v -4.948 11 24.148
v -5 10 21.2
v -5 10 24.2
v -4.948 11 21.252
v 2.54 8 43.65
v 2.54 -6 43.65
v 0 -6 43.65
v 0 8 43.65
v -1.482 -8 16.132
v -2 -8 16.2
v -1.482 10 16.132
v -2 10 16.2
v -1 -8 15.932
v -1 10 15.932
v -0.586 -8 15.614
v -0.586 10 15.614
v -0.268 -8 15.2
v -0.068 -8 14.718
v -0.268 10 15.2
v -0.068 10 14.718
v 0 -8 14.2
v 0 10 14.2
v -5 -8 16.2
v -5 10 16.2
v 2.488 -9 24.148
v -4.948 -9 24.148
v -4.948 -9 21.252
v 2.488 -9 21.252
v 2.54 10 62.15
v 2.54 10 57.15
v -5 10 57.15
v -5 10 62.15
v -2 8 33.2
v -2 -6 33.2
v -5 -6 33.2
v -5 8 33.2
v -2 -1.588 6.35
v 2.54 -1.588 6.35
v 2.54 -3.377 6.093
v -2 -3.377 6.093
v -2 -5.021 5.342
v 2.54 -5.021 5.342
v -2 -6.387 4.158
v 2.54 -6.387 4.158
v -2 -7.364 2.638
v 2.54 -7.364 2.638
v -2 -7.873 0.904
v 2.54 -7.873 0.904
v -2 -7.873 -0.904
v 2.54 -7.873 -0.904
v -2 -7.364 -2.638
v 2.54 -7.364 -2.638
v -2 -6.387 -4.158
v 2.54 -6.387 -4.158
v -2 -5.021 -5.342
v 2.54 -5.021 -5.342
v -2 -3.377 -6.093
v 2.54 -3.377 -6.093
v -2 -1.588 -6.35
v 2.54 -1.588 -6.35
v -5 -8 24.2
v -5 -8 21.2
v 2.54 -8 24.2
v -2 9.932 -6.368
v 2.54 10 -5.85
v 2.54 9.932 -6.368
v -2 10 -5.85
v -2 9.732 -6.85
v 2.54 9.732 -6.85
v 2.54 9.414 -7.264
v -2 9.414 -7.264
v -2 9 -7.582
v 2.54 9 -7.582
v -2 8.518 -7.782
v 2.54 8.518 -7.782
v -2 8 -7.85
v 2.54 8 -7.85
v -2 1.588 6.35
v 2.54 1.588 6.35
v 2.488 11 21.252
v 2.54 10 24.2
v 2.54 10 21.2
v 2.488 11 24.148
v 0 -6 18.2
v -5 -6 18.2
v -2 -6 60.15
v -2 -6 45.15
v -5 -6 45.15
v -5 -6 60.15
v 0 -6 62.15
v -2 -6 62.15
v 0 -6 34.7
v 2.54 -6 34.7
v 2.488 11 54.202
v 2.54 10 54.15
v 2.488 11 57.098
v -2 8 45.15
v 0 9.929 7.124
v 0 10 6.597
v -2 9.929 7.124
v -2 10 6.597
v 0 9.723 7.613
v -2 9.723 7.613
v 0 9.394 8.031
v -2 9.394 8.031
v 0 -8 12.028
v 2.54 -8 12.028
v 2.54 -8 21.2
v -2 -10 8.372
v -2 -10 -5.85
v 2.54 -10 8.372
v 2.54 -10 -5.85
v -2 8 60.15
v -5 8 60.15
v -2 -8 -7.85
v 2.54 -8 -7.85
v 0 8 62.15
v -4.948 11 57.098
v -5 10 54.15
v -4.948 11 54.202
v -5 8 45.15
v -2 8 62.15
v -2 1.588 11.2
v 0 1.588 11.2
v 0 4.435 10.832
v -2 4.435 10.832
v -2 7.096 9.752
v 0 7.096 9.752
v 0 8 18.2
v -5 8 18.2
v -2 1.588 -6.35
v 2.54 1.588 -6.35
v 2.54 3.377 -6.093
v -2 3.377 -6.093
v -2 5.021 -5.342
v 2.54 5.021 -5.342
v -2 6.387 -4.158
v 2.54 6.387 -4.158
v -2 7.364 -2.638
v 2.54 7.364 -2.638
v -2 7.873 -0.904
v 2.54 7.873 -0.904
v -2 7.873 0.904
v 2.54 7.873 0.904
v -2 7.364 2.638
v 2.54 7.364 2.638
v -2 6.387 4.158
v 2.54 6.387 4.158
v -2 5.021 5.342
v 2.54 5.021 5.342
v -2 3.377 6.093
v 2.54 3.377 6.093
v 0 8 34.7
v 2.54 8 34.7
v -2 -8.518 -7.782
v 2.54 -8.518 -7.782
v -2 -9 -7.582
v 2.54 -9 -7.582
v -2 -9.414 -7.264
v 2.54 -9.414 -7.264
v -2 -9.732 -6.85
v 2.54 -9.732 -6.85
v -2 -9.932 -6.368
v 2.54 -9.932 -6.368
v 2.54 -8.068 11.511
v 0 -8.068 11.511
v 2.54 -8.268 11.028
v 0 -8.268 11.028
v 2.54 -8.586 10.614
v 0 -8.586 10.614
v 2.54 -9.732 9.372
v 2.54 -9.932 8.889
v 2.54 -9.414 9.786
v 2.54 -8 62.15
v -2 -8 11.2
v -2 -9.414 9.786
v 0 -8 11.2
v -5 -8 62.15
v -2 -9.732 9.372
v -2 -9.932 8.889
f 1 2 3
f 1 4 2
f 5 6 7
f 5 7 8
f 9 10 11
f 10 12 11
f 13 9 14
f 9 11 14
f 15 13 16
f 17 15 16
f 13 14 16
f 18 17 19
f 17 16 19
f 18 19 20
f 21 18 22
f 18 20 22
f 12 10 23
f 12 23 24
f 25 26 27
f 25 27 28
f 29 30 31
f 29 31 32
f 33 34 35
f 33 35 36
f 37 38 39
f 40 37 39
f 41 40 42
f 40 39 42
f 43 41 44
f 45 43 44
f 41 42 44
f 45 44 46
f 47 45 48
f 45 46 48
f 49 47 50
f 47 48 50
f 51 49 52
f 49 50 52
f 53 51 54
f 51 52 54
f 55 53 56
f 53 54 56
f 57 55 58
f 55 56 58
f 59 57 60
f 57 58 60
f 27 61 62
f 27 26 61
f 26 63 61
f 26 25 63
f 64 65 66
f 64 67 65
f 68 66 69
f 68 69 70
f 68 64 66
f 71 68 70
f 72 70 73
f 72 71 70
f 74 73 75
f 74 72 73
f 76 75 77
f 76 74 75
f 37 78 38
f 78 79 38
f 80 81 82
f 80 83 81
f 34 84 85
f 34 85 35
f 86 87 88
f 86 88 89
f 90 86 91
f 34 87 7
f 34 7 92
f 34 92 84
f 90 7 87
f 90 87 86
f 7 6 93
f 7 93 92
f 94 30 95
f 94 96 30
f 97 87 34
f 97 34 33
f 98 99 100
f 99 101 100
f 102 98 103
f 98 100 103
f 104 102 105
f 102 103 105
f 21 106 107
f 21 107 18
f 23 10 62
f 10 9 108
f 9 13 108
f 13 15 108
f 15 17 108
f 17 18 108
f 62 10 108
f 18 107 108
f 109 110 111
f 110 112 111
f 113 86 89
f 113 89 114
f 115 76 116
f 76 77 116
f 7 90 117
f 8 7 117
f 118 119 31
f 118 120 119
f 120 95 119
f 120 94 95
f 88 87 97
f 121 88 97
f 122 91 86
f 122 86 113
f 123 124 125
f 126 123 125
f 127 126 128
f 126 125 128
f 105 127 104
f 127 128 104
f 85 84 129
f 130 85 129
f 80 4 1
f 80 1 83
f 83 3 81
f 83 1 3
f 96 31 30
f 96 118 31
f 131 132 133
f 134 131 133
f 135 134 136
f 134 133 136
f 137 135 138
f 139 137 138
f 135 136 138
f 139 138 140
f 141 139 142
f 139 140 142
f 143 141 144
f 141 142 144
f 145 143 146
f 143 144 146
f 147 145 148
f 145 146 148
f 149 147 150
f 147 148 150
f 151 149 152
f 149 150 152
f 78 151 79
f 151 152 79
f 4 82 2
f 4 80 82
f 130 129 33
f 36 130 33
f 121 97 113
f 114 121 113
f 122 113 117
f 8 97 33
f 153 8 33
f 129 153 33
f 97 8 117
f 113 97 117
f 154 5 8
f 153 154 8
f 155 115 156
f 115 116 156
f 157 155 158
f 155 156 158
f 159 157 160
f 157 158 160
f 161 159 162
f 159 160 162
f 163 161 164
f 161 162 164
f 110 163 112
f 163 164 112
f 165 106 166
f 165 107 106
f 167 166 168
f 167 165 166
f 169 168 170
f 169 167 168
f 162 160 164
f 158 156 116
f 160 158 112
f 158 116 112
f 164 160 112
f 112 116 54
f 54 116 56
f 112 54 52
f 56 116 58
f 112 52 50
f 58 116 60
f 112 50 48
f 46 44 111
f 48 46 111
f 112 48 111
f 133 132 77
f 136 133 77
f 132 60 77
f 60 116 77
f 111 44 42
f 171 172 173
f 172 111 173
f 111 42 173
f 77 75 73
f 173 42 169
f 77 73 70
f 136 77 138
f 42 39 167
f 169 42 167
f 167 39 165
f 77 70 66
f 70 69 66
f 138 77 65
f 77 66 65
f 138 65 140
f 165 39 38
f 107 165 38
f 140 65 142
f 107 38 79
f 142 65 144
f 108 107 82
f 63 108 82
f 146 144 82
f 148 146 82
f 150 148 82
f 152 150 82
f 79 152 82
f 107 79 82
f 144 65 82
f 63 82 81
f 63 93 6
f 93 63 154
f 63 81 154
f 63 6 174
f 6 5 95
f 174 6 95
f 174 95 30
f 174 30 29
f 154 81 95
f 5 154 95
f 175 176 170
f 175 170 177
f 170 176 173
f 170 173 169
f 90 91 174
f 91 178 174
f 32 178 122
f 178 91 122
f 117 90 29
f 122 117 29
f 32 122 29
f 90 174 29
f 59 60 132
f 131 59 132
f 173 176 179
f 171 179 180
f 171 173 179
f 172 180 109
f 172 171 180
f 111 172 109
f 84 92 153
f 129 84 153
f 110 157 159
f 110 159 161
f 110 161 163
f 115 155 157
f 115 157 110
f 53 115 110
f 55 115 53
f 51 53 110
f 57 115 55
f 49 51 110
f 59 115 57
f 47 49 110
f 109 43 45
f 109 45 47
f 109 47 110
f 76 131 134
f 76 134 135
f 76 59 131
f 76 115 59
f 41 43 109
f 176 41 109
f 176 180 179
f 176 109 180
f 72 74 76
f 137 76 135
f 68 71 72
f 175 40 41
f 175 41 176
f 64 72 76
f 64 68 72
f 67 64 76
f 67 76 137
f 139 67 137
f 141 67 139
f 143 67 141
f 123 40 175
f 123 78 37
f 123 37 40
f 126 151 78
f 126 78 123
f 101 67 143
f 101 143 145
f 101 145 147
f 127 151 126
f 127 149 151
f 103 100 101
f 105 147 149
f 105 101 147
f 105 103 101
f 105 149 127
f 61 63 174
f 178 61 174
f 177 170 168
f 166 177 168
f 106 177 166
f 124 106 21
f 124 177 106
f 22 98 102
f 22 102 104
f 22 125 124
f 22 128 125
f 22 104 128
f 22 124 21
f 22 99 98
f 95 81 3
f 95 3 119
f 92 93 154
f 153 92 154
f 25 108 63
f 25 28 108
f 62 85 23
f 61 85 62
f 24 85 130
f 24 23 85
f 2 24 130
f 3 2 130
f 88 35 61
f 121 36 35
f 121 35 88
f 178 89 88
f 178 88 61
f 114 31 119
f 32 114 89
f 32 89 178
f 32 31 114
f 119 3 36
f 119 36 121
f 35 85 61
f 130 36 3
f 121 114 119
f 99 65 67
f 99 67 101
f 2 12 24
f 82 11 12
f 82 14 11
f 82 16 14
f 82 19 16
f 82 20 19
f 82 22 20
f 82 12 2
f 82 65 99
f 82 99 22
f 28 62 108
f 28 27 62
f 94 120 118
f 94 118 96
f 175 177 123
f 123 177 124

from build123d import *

# Parameters (mm, degrees)
EXTRUDE1_DEPTH     = 2.54
EXTRUDE2_DEPTH     = 2
SKETCH4_W          = 45.95
SKETCH4_H          = 18
SKETCH4_W_2        = 41.95
SKETCH4_H_2        = 14
EXTRUDE3_DEPTH     = 5
SKETCH5_W          = 11.95
SKETCH5_H          = 14
EXTRUDE4_DEPTH     = 5
SKETCH6_W          = 2
SKETCH6_H          = 14
CUT_EXTRUDE1_DEPTH = 43.95
CUT_EXTRUDE2_REACH = 9.54
SKETCH7_W          = 8.95
SKETCH7_H          = 14
FILLET1_R          = 2
SKETCH8_W          = 7.54
SKETCH8_H          = 3
EXTRUDE5_DEPTH     = 1
EXTRUDE5_TAPER     = 3
SKETCH9_W          = 7.54
SKETCH9_H          = 3
EXTRUDE6_DEPTH     = 1
EXTRUDE6_TAPER     = 3


with BuildPart() as part:
    # Sketch1 → Extrude1 (new body)
    with BuildSketch(Plane(origin=(0, 0, 0), x_dir=(0, 0, -1), z_dir=(1, 0, 0))):
        Polygon((-62.15, 10), (7.85, 10), (7.85, -10), (-9.2, -10), (-11.2, -8), (-62.15, -8), align=None)
        with BuildLine():
            Line((-6.35, 1.5875), (-6.35, -1.5875))
            ThreePointArc((-6.35, -1.5875), (0, -7.9375), (6.35, -1.5875))
            Line((6.35, -1.5875), (6.35, 1.5875))
            ThreePointArc((6.35, 1.5875), (0, 7.9375), (-6.35, 1.5875))
        make_face(mode=Mode.SUBTRACT)
    extrude(amount=EXTRUDE1_DEPTH)

    # Sketch3 → Extrude2 (add)
    with BuildSketch(Plane.ZY):
        with BuildLine():
            Line((11.2, -8), (11.200000082, 1.5875))
            ThreePointArc((11.200000082, 1.5875), (10.204208676, 6.204222555), (7.393905977, 10))
            Line((7.393905977, 10), (-7.85, 10))
            Line((-7.85, 10), (-7.85, -10))
            Line((-7.85, -10), (9.2, -10))
            Line((9.2, -10), (11.2, -8))
        make_face()
        with BuildLine():
            Line((6.35, 1.5875), (6.35, -1.5875))
            ThreePointArc((6.35, -1.5875), (0, -7.9375), (-6.35, -1.5875))
            Line((-6.35, -1.5875), (-6.35, 1.5875))
            ThreePointArc((-6.35, 1.5875), (0, 7.9375), (6.35, 1.5875))
        make_face(mode=Mode.SUBTRACT)
    extrude(amount=EXTRUDE2_DEPTH)

    # Sketch4 → Extrude3 (add)
    with BuildSketch(Plane.ZY):
        with Locations((39.175, 1)):
            Rectangle(SKETCH4_W, SKETCH4_H)
        with Locations((39.175, 1)):
            Rectangle(SKETCH4_W_2, SKETCH4_H_2, mode=Mode.SUBTRACT)
    extrude(amount=EXTRUDE3_DEPTH)

    # Sketch5 → Extrude4 (add)
    with BuildSketch(Plane.ZY):
        with Locations((39.175, 1)):
            Rectangle(SKETCH5_W, SKETCH5_H)
    extrude(amount=EXTRUDE4_DEPTH)

    # Sketch6 → Cut-Extrude1 (cut)
    with BuildSketch(Plane.XY.offset(62.15)):
        with Locations((-1, 1)):
            Rectangle(SKETCH6_W, SKETCH6_H)
    extrude(amount=-CUT_EXTRUDE1_DEPTH, mode=Mode.SUBTRACT)

    # Sketch7 → Cut-Extrude2 (cut, up to next)
    with BuildSketch(Plane(origin=(2.54, 0, 0), x_dir=(0, 0, -1), z_dir=(1, 0, 0)), mode=Mode.PRIVATE) as cut_extrude2_sk1:
        with Locations((-39.175, 1)):
            Rectangle(SKETCH7_W, SKETCH7_H)
    cut_extrude2_tool1 = extrude(cut_extrude2_sk1.sketch, amount=-CUT_EXTRUDE2_REACH, mode=Mode.PRIVATE) & part.part
    add(cut_extrude2_tool1.solids().sort_by_distance((2.54, 1, 39.175))[0], mode=Mode.SUBTRACT)

    # Fillet1
    fillet1_edges = [part.edges().sort_by_distance(p)[0] for p in [
        (0.27, 10, -7.85),
        (0.27, -10, -7.85),
        (0.27, -10, 9.2),
        (1.27, -8, 11.2),
        (-1, 10, 7.393905977),
        (0, 1, 16.2),
    ]]
    fillet(fillet1_edges, radius=FILLET1_R)

    # Sketch8 → Extrude5 (add)
    with BuildSketch(Plane(origin=(0, 10, 0), x_dir=(1, 0, 0), z_dir=(0, 1, 0))):
        with Locations((-1.23, -22.7)):
            Rectangle(SKETCH8_W, SKETCH8_H)
        with Locations((-1.23, -55.65)):
            Rectangle(SKETCH8_W, SKETCH8_H)
    extrude(amount=EXTRUDE5_DEPTH, taper=EXTRUDE5_TAPER)

    # Sketch9 → Extrude6 (add)
    with BuildSketch(Plane.XZ.offset(8)):
        with Locations((-1.23, 22.7)):
            Rectangle(SKETCH9_W, SKETCH9_H)
    extrude(amount=EXTRUDE6_DEPTH, taper=EXTRUDE6_TAPER)


solid = part.part
